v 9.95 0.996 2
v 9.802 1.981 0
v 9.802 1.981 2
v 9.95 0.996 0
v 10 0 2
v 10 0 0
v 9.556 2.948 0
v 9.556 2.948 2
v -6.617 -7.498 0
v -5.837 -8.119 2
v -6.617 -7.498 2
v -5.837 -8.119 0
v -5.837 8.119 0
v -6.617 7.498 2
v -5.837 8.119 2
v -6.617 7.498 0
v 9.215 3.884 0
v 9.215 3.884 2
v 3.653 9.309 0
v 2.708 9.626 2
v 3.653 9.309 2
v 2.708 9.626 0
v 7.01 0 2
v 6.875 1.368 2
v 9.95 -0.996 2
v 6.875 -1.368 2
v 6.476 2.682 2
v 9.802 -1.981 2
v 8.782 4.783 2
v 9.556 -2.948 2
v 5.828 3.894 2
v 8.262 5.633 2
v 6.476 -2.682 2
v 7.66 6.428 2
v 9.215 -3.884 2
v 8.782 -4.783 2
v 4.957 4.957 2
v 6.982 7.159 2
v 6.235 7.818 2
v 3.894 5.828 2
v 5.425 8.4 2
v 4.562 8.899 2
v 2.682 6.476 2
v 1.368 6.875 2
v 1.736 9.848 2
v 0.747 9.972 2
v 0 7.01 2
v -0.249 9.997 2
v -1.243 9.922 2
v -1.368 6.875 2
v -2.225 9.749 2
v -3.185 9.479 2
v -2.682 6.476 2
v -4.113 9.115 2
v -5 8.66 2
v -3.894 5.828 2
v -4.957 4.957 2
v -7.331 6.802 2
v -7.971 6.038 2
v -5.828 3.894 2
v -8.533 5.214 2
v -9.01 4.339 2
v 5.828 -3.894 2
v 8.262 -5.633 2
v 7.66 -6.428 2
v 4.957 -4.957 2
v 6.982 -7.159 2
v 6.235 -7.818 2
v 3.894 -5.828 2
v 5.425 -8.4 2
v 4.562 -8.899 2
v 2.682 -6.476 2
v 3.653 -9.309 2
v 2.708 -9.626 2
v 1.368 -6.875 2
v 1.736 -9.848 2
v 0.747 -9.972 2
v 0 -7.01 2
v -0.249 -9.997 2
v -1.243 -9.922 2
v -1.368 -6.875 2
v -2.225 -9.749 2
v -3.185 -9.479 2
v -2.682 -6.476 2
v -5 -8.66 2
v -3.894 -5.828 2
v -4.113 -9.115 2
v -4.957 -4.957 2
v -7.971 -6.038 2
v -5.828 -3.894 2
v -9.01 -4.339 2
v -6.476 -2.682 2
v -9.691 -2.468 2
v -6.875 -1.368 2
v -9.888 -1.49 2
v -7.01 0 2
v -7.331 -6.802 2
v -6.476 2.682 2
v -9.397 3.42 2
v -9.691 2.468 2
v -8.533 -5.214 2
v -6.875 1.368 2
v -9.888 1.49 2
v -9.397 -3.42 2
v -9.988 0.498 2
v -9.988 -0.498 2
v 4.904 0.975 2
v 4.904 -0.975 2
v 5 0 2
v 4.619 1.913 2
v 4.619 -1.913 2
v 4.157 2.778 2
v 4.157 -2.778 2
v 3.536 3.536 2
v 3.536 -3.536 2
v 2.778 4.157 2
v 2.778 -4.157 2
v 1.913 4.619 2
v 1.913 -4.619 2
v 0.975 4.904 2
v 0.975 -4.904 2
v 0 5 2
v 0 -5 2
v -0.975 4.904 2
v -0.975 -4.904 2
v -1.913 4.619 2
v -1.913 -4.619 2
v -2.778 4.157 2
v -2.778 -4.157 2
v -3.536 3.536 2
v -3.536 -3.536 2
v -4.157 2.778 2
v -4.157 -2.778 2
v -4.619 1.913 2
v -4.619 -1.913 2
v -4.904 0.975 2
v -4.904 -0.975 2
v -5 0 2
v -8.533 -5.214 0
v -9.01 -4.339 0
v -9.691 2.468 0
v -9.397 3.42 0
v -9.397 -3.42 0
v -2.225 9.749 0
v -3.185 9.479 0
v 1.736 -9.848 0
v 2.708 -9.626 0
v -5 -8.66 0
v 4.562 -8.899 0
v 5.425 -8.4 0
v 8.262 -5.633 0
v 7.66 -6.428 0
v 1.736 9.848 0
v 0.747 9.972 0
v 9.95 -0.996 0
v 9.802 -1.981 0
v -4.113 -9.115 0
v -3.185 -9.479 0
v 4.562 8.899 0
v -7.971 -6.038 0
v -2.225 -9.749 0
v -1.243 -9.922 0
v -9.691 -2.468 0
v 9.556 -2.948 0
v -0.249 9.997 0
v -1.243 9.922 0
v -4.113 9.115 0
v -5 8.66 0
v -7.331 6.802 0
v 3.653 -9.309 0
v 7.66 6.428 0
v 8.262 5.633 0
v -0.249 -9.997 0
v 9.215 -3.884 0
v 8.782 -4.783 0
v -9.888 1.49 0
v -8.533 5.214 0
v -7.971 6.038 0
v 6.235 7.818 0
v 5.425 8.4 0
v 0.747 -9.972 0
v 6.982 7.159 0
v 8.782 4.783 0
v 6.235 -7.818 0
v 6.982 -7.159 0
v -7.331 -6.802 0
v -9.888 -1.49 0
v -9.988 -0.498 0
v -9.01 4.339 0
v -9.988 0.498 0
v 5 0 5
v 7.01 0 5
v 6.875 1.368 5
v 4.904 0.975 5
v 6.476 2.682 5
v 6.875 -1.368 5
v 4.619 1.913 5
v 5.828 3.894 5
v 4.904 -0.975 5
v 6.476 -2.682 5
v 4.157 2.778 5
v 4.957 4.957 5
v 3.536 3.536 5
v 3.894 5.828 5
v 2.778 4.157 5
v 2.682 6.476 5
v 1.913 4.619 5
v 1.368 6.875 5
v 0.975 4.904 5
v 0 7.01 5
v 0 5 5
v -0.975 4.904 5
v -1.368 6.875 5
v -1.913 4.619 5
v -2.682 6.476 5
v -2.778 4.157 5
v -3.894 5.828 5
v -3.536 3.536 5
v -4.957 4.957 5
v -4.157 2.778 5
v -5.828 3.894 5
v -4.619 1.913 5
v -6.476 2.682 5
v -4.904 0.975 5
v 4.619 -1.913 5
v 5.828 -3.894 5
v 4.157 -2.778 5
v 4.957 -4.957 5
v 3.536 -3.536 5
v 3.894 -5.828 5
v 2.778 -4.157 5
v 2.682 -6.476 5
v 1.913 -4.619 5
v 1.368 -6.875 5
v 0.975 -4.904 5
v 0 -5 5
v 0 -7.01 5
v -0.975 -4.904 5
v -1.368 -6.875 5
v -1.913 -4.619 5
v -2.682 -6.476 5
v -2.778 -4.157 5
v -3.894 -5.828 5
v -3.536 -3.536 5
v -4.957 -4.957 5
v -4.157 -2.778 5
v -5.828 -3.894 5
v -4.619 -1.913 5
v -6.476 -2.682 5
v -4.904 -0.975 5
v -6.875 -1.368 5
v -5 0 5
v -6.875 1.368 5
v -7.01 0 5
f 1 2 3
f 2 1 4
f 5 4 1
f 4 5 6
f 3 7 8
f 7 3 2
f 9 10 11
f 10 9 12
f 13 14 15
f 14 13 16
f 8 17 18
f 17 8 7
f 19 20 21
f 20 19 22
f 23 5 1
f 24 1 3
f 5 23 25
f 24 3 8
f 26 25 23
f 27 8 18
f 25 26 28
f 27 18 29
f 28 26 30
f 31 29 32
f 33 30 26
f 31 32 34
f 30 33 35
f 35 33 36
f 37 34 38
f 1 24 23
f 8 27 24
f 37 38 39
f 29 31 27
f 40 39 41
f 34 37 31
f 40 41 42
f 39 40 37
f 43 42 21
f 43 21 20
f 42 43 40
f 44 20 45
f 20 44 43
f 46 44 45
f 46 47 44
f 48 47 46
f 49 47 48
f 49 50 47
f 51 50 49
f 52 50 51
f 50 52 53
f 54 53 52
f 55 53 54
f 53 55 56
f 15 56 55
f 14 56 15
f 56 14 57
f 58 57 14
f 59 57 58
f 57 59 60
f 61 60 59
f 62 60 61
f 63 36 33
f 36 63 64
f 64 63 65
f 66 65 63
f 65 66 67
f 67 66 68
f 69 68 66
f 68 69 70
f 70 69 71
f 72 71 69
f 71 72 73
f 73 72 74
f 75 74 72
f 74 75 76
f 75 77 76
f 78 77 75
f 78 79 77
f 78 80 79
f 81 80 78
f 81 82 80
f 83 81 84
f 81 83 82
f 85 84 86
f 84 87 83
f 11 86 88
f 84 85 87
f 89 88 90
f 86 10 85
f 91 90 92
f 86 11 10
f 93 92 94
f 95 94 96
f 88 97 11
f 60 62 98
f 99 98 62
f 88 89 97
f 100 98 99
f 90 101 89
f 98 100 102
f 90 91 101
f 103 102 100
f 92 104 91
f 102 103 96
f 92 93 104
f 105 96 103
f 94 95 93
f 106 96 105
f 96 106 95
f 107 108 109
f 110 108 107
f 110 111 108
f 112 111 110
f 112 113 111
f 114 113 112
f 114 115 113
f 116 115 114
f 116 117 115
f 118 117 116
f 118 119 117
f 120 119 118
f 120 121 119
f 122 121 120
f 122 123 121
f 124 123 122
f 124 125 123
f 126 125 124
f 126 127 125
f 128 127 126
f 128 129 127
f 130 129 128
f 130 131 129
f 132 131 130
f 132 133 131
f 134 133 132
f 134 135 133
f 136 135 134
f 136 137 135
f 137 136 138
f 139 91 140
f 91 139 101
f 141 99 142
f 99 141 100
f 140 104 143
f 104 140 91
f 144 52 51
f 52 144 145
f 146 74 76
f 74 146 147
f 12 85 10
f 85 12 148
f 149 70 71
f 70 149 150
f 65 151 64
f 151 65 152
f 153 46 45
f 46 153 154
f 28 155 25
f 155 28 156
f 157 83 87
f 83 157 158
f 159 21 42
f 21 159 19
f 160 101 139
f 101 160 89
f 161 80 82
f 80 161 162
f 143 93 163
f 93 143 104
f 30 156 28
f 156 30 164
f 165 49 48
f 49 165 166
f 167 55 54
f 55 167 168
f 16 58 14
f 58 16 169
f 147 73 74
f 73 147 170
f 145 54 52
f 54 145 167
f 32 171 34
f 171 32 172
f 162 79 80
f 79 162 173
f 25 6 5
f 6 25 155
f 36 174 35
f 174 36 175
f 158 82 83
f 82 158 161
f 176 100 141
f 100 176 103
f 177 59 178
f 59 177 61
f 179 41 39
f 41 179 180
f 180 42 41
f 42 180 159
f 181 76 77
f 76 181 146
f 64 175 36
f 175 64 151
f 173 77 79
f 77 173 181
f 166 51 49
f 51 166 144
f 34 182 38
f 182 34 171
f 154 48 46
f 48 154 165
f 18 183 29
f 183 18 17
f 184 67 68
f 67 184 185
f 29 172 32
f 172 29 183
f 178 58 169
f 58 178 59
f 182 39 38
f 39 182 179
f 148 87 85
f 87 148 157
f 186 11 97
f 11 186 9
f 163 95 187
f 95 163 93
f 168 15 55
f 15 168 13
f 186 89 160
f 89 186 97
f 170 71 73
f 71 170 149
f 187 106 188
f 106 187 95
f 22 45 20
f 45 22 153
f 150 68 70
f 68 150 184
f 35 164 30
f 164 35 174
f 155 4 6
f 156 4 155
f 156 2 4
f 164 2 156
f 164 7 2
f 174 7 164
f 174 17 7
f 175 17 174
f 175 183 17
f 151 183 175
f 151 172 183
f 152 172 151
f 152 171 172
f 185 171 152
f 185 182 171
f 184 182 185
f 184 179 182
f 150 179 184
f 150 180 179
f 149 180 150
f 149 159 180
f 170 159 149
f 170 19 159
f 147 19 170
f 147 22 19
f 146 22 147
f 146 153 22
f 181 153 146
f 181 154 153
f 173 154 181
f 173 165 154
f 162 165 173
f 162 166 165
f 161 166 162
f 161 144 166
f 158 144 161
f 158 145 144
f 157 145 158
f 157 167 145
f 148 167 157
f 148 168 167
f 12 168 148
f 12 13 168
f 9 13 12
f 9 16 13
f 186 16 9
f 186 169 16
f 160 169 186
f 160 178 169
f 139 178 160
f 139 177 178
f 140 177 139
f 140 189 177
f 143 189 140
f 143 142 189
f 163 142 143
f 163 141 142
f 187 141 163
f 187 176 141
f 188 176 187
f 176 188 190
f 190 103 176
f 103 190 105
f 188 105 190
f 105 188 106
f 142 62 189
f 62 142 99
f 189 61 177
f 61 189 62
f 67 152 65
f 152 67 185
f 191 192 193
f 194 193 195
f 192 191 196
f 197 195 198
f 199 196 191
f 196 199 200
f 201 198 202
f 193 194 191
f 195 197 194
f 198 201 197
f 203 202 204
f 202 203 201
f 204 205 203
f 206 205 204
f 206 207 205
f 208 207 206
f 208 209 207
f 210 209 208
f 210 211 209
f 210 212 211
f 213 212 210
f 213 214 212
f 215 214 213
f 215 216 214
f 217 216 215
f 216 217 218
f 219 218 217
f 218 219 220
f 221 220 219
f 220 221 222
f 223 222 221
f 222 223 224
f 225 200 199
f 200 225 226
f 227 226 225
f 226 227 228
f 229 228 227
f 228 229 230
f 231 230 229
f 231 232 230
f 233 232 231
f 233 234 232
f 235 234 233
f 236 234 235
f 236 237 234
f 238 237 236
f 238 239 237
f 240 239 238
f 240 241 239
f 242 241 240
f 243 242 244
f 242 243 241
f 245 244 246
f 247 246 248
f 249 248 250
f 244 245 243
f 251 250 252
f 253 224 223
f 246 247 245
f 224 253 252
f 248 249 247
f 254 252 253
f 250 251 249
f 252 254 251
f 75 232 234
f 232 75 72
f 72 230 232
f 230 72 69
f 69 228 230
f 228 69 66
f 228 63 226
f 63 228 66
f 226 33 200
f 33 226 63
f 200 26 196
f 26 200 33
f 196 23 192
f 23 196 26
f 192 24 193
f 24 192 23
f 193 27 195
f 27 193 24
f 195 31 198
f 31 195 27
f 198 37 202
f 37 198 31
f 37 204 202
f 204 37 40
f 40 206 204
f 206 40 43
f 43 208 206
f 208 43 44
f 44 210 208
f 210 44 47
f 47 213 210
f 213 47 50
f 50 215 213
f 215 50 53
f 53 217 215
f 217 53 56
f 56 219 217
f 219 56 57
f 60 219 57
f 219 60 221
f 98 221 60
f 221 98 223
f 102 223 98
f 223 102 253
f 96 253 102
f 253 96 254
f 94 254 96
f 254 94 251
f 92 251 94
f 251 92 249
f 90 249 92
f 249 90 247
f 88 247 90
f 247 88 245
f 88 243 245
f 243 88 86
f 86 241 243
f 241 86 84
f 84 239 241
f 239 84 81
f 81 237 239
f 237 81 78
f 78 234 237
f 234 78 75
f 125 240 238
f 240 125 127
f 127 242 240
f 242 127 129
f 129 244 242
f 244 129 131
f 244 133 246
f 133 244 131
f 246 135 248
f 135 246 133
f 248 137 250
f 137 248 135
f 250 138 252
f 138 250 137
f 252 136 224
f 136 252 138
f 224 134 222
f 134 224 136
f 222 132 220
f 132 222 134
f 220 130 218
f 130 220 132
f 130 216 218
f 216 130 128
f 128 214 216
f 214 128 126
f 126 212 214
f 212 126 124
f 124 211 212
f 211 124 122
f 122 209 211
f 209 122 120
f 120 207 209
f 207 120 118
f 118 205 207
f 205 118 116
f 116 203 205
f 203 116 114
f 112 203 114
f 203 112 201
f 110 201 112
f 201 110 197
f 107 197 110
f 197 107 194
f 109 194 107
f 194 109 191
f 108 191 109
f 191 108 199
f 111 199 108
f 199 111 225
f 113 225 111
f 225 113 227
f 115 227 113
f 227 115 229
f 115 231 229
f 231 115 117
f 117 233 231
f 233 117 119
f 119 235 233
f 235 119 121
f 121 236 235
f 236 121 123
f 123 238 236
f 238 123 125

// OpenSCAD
$fa = 1;
$fs = 1;

mm = 1;

magnet_dia = 10 * mm;
magnet_height = 3 * mm;

wall_width = 2 * mm;

fm_height = 2 * mm;
fm_width = 20 * mm;

module fridge_magnet()
{
    cylinder(h = fm_height, d = fm_width);
    translate([ 0, 0, fm_height ]) linear_extrude(magnet_height) difference()
    {
        offset(delta = wall_width) circle(d = magnet_dia);
        circle(d = magnet_dia);
    }
}

fridge_magnet();
